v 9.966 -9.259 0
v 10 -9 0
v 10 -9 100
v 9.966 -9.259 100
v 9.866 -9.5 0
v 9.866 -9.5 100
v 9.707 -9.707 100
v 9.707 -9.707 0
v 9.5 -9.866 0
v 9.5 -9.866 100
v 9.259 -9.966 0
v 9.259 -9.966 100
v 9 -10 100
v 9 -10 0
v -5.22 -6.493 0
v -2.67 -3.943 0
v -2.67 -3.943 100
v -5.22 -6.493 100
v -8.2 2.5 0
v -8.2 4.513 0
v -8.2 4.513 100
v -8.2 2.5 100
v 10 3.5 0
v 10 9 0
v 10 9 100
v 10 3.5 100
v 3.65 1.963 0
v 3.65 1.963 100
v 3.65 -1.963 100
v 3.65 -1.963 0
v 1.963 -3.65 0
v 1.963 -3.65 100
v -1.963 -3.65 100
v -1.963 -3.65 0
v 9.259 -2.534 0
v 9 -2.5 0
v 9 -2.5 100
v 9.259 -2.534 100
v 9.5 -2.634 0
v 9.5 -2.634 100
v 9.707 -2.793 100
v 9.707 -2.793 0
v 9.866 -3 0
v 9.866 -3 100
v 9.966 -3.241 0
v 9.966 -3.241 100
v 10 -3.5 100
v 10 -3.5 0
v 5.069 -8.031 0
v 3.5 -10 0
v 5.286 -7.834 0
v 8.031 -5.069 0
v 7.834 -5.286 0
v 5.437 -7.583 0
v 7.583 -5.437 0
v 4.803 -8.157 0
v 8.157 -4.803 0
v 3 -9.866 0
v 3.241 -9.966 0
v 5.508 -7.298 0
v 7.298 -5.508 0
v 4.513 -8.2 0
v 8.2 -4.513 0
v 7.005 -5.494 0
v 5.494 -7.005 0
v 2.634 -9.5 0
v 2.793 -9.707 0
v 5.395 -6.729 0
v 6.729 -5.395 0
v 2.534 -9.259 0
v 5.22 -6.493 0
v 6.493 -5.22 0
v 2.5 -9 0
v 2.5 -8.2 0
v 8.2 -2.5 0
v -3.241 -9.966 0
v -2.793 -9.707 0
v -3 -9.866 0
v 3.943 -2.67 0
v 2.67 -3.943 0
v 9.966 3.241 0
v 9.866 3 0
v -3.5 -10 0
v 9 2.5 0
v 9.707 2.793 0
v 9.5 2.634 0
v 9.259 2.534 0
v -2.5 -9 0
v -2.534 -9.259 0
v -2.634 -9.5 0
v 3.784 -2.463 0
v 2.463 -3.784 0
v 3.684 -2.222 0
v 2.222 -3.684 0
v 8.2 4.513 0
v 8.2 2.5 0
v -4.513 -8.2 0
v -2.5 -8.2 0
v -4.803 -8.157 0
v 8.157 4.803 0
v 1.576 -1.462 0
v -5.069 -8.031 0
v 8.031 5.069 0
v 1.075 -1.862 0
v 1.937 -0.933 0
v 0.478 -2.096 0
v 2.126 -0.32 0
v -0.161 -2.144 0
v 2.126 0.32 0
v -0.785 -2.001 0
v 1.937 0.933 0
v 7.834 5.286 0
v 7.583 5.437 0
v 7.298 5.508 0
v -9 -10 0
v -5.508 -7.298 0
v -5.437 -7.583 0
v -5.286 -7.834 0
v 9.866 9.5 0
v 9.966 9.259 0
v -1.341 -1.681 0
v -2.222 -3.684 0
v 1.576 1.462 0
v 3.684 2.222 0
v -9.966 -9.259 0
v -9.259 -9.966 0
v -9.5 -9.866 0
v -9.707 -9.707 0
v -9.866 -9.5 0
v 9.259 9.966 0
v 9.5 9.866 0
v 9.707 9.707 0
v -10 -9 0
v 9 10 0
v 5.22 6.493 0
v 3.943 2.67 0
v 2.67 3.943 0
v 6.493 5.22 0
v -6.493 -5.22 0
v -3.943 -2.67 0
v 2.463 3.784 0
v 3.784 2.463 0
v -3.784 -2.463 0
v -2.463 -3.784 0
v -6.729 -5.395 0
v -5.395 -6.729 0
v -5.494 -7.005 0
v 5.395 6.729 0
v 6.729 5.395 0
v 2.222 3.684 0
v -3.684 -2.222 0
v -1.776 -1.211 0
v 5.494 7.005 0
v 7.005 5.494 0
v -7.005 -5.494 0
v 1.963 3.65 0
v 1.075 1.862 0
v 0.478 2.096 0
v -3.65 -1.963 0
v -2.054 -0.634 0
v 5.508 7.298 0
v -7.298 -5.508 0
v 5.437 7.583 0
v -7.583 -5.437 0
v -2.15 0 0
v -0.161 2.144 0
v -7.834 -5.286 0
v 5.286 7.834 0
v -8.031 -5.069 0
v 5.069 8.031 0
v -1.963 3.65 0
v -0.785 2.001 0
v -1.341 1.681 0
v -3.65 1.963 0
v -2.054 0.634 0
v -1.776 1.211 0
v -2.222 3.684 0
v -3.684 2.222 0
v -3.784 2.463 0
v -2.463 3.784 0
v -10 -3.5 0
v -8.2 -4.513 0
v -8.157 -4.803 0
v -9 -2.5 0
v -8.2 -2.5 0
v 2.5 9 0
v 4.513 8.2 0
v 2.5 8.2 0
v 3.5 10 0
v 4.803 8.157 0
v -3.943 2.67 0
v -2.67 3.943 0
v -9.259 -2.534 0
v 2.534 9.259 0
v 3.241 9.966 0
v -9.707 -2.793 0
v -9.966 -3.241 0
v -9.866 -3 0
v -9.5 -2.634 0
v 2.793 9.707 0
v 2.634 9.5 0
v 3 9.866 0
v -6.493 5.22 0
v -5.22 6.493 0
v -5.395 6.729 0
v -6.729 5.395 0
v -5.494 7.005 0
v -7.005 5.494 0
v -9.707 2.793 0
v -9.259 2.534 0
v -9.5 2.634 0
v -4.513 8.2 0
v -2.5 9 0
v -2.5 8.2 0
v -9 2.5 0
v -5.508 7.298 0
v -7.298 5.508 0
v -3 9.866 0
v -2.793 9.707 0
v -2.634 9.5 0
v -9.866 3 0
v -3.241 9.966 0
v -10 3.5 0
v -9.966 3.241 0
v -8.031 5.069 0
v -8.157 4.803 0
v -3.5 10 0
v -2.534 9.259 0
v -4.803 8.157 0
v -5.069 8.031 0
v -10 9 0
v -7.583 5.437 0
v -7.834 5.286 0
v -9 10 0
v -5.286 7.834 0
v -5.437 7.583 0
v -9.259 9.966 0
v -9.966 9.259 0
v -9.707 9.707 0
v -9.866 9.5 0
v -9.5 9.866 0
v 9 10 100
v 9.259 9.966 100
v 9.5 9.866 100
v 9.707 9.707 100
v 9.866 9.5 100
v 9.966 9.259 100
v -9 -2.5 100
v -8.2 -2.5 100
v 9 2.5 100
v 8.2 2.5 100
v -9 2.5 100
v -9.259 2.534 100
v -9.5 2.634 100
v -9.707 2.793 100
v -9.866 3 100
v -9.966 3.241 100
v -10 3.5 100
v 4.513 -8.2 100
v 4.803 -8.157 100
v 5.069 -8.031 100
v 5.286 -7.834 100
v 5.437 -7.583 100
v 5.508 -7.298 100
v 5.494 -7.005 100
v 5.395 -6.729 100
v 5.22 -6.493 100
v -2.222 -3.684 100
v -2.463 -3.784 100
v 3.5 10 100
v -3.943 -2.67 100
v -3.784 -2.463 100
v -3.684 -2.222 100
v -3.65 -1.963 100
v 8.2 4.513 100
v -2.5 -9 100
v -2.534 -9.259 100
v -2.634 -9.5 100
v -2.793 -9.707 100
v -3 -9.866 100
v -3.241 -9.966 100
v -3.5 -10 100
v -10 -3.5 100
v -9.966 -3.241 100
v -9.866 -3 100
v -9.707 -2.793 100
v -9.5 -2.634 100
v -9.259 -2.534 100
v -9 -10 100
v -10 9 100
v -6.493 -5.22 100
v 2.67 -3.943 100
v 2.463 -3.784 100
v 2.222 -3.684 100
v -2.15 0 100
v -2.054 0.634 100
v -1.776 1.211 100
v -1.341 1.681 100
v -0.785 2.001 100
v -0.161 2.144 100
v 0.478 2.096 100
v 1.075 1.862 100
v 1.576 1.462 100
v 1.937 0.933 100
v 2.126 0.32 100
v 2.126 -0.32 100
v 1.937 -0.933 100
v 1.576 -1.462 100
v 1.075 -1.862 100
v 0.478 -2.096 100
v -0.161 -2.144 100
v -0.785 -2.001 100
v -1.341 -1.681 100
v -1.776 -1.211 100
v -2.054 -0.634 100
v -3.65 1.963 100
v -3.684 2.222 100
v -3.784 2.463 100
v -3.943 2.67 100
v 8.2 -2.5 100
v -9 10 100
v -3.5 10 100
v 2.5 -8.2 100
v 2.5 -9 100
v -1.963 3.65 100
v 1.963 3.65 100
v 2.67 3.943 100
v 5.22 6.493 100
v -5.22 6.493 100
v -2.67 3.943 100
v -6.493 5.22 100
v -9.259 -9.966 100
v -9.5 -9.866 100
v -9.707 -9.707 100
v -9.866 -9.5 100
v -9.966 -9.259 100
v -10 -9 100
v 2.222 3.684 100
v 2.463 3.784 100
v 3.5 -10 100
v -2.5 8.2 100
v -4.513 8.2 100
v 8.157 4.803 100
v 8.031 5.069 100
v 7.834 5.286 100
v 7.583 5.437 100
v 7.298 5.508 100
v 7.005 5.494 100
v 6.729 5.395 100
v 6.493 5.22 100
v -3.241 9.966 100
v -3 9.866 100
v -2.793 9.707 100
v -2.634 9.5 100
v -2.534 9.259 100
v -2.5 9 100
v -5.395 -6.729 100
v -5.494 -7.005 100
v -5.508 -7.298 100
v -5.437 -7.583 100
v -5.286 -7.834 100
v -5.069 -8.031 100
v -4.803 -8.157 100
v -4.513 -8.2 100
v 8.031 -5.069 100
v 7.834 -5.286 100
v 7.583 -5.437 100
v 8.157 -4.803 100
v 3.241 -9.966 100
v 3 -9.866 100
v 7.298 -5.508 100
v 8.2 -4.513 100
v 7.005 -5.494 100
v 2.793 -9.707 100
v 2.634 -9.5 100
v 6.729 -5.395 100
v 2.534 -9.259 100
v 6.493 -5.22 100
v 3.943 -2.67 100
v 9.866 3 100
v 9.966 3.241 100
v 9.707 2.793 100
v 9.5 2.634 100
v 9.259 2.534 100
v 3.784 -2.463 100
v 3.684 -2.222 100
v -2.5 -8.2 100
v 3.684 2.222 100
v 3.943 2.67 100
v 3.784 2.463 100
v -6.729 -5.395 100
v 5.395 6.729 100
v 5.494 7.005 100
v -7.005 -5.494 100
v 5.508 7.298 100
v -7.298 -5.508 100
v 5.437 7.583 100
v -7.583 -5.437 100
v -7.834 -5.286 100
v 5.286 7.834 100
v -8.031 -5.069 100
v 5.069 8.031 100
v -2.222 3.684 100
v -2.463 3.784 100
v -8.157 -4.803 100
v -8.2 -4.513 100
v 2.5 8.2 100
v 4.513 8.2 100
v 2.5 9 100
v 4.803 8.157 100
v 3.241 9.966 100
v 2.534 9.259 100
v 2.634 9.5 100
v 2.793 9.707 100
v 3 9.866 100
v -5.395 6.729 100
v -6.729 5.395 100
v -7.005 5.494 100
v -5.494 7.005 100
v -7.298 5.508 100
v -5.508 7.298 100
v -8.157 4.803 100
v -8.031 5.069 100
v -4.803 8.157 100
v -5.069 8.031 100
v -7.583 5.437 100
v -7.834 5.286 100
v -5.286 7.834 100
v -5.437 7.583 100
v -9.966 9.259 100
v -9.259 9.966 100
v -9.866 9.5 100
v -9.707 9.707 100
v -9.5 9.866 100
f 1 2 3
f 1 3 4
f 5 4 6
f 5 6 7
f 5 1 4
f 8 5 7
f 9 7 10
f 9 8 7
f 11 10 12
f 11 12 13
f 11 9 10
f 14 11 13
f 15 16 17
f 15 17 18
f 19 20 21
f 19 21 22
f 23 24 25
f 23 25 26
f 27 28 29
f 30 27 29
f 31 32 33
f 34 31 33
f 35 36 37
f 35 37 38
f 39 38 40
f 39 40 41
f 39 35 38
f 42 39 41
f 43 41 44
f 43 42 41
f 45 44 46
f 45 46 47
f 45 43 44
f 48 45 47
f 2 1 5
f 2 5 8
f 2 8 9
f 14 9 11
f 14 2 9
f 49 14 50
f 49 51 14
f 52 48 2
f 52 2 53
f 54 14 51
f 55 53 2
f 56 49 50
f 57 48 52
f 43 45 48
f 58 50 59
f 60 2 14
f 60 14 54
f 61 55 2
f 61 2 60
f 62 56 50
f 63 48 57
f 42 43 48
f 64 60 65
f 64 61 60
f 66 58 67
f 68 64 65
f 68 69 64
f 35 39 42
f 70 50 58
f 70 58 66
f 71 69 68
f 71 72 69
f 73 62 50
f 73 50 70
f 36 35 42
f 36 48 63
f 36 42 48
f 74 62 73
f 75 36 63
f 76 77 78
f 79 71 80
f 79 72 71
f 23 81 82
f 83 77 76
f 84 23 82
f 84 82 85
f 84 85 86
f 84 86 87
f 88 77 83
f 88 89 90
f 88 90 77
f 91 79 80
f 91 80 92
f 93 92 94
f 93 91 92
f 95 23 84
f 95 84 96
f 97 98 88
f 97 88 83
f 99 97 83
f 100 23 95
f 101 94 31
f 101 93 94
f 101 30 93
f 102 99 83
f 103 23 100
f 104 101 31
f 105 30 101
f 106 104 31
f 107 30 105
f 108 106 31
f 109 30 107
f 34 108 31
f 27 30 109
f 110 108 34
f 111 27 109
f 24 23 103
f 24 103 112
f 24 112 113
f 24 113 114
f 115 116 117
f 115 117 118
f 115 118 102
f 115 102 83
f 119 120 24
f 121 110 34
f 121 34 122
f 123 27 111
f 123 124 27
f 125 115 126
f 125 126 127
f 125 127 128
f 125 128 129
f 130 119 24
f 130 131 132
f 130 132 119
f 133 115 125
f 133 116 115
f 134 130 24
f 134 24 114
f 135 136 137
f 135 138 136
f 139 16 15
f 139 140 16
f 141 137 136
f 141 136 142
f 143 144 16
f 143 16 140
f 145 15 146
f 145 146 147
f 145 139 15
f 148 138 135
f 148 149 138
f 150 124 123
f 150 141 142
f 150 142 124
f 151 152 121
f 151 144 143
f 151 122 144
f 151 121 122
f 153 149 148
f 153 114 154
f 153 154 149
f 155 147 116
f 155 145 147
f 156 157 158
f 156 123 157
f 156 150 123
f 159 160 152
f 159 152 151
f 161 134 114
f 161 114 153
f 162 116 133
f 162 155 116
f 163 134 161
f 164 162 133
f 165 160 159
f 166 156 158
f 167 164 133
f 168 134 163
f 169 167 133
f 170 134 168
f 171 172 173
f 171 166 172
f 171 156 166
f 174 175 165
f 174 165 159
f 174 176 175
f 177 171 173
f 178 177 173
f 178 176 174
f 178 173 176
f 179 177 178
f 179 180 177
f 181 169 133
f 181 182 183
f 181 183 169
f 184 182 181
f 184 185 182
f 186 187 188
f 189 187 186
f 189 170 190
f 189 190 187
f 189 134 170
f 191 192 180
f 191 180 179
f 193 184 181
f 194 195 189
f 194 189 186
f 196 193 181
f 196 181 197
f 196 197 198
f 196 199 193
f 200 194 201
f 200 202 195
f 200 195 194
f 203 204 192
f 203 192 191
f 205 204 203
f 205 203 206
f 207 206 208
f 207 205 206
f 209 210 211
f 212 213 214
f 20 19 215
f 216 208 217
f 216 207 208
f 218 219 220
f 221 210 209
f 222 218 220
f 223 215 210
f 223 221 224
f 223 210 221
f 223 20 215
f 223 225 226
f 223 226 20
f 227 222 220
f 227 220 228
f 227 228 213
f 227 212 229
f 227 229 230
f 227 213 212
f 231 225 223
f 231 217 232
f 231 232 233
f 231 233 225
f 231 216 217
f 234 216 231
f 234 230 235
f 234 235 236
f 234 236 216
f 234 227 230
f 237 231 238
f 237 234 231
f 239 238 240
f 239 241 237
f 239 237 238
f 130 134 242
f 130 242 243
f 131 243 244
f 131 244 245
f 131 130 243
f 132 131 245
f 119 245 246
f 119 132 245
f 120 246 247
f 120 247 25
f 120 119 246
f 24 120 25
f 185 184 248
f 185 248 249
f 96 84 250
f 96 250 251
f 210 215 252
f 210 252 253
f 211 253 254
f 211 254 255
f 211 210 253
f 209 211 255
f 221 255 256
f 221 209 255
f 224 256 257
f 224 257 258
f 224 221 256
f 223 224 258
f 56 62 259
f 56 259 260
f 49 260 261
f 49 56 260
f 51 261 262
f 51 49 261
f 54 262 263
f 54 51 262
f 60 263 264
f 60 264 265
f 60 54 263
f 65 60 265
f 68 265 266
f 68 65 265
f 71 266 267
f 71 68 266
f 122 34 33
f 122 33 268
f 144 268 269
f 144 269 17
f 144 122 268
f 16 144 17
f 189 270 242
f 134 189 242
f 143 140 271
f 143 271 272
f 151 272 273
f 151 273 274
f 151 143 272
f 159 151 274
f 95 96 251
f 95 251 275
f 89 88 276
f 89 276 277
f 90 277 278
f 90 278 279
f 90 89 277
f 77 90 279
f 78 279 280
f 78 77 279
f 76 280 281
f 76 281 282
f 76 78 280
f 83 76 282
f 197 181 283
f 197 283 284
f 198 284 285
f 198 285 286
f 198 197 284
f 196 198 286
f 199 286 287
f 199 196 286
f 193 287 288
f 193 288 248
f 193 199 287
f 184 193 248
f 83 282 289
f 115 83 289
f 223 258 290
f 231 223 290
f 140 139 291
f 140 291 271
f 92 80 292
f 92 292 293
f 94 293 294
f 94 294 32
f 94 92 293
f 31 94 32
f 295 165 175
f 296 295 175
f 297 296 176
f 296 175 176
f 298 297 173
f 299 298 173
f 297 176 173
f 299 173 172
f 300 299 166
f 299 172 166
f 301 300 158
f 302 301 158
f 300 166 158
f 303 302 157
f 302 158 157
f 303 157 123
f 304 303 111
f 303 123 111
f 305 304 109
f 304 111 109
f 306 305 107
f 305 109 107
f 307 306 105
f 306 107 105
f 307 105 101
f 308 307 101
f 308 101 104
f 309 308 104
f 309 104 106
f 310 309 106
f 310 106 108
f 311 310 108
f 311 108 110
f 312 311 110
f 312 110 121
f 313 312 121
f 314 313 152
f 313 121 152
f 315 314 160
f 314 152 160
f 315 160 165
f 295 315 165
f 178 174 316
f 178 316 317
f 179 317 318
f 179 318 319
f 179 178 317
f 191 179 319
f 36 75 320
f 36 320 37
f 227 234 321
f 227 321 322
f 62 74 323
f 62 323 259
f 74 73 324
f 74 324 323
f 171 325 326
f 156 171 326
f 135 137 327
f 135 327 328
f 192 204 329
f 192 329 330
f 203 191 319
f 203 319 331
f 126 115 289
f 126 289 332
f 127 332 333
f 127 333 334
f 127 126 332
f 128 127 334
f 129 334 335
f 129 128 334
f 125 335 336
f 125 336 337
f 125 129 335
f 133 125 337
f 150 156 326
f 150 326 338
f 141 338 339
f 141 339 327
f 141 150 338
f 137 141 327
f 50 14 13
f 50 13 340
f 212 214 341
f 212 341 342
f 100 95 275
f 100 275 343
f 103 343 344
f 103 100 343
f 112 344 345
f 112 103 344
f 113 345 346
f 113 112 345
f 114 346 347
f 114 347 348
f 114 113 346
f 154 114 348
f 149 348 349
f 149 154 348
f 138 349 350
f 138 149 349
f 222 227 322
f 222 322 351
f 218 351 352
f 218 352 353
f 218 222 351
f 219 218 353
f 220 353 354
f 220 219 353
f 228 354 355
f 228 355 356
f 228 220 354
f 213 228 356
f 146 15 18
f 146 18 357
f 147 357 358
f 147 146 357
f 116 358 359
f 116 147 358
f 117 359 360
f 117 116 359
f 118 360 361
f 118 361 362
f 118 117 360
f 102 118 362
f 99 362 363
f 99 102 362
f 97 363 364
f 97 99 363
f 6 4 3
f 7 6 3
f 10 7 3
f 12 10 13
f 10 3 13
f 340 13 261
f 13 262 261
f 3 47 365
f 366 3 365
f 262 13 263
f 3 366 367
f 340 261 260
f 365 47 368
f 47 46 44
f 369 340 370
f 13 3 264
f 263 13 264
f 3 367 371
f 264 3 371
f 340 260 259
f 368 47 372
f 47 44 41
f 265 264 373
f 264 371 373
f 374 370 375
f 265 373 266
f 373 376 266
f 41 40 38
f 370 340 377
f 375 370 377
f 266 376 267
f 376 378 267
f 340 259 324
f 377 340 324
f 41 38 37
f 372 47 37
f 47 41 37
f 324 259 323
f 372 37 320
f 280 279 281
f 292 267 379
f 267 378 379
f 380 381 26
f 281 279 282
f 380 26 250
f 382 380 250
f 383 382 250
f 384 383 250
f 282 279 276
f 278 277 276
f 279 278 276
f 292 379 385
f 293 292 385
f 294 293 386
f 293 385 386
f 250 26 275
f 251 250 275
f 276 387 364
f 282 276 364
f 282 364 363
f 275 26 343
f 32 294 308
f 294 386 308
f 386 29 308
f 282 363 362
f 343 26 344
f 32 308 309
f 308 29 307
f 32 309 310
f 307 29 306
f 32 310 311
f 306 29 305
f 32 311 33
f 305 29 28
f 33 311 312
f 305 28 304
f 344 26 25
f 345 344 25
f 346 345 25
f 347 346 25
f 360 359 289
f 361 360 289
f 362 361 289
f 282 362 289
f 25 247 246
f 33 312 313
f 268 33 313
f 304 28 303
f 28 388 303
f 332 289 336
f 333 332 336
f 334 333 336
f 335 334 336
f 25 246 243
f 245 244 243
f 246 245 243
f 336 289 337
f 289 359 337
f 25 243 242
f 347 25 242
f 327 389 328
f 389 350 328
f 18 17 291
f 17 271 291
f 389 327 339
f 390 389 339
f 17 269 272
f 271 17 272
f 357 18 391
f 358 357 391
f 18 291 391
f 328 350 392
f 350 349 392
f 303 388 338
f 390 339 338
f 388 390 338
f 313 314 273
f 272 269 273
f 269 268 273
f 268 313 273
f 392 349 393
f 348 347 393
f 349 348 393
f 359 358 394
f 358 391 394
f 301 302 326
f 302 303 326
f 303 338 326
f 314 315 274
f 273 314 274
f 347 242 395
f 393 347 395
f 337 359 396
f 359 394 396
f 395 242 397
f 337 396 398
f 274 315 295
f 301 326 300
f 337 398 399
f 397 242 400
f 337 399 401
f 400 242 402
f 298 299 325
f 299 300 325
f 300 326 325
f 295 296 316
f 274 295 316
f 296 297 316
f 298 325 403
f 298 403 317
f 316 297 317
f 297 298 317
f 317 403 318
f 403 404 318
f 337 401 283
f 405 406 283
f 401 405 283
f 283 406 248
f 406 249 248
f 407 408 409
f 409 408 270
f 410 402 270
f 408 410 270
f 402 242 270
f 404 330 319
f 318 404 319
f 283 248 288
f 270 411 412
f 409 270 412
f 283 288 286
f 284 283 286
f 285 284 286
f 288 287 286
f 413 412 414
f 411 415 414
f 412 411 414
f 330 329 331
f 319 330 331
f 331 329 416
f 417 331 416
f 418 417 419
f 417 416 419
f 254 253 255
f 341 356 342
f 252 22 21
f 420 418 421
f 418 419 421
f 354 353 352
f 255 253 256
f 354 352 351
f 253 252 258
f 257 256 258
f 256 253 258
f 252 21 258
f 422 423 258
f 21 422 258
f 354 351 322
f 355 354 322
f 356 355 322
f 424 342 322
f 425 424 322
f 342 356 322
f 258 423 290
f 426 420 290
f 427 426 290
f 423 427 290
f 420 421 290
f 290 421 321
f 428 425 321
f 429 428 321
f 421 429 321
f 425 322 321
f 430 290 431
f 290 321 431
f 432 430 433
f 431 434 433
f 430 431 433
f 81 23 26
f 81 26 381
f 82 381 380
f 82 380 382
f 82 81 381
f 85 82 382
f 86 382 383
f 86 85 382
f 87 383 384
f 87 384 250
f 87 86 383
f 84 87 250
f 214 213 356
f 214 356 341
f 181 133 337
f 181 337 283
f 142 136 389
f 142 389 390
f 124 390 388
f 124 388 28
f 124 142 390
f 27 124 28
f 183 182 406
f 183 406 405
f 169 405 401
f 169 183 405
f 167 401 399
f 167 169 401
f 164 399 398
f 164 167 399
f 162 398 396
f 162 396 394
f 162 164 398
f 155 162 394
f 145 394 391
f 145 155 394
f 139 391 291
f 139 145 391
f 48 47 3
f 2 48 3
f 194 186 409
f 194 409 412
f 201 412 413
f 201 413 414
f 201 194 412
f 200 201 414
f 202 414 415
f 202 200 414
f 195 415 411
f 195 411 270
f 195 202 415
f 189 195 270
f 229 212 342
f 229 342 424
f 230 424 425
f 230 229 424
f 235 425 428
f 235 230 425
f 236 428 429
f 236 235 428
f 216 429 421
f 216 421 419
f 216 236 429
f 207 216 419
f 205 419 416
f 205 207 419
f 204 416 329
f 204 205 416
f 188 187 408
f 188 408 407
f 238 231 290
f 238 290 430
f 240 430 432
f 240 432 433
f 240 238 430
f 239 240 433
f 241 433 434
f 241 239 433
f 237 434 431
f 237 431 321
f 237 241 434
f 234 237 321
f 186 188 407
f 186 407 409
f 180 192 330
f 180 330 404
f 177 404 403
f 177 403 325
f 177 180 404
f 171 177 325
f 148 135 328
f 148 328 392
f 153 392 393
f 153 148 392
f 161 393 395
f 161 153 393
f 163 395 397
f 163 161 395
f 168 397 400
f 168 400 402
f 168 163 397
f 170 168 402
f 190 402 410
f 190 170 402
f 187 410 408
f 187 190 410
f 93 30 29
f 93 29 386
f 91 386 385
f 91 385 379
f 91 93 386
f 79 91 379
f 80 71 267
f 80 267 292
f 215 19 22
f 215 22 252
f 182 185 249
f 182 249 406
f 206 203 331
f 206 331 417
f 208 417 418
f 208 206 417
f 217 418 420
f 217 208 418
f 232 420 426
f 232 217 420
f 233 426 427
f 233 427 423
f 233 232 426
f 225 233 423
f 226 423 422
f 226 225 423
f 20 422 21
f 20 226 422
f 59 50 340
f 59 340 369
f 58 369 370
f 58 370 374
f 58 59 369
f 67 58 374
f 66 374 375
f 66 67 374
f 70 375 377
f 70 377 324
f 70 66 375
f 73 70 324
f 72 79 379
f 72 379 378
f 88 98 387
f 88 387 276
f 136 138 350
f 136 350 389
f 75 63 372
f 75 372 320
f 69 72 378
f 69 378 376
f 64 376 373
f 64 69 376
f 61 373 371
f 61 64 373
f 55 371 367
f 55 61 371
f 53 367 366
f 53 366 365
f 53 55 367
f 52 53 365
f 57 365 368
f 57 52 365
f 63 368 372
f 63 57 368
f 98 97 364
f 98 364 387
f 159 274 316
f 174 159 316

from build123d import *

# Parameters (mm, degrees)
SCHIZZO1_R                   = 2.15
ESTRUSIONE_ESTRUSIONE1_DEPTH = 100


with BuildPart() as part:
    # Schizzo1 → Estrusione-Estrusione1 (new body)
    with BuildSketch(Plane(origin=(0, 0, 0), x_dir=(-1, 0, 0), z_dir=(0, 0, -1))):
        with BuildLine():
            Line((8.2, 2.5), (9, 2.5))
            ThreePointArc((9, 2.5), (9.707106781, 2.792893219), (10, 3.5))
            Line((10, 3.5), (10, 9))
            ThreePointArc((10, 9), (9.707106781, 9.707106781), (9, 10))
            Line((9, 10), (3.5, 10))
            ThreePointArc((3.5, 10), (2.792893219, 9.707106781), (2.5, 9))
            Line((2.5, 9), (2.5, 8.2))
            Line((2.5, 8.2), (4.512994231, 8.2))
            ThreePointArc((4.512994231, 8.2), (5.436873764, 7.582683432), (5.220101013, 6.492893219))
            Line((5.220101013, 6.492893219), (2.670101013, 3.942893219))
            ThreePointArc((2.670101013, 3.942893219), (2.345677664, 3.726120467), (1.962994231, 3.65))
            Line((1.962994231, 3.65), (-1.962994231, 3.65))
            ThreePointArc((-1.962994231, 3.65), (-2.345677664, 3.726120467), (-2.670101013, 3.942893219))
            Line((-2.670101013, 3.942893219), (-5.220101013, 6.492893219))
            ThreePointArc((-5.220101013, 6.492893219), (-5.436873764, 7.582683432), (-4.512994231, 8.2))
            Line((-4.512994231, 8.2), (-2.5, 8.2))
            Line((-2.5, 8.2), (-2.5, 9))
            ThreePointArc((-2.5, 9), (-2.792893219, 9.707106781), (-3.5, 10))
            Line((-3.5, 10), (-9, 10))
            ThreePointArc((-9, 10), (-9.707106781, 9.707106781), (-10, 9))
            Line((-10, 9), (-10, 3.5))
            ThreePointArc((-10, 3.5), (-9.707106781, 2.792893219), (-9, 2.5))
            Line((-9, 2.5), (-8.2, 2.5))
            Line((-8.2, 2.5), (-8.2, 4.512994231))
            ThreePointArc((-8.2, 4.512994231), (-7.582683432, 5.436873764), (-6.492893219, 5.220101013))
            Line((-6.492893219, 5.220101013), (-3.942893219, 2.670101013))
            ThreePointArc((-3.942893219, 2.670101013), (-3.726120467, 2.345677664), (-3.65, 1.962994231))
            Line((-3.65, 1.962994231), (-3.65, -1.962994231))
            ThreePointArc((-3.65, -1.962994231), (-3.726120467, -2.345677664), (-3.942893219, -2.670101013))
            Line((-3.942893219, -2.670101013), (-6.492893219, -5.220101013))
            ThreePointArc((-6.492893219, -5.220101013), (-7.582683432, -5.436873764), (-8.2, -4.512994231))
            Line((-8.2, -4.512994231), (-8.2, -2.5))
            Line((-8.2, -2.5), (-9, -2.5))
            ThreePointArc((-9, -2.5), (-9.707106781, -2.792893219), (-10, -3.5))
            Line((-10, -3.5), (-10, -9))
            ThreePointArc((-10, -9), (-9.707106781, -9.707106781), (-9, -10))
            Line((-9, -10), (-3.5, -10))
            ThreePointArc((-3.5, -10), (-2.792893219, -9.707106781), (-2.5, -9))
            Line((-2.5, -9), (-2.5, -8.2))
            Line((-2.5, -8.2), (-4.512994231, -8.2))
            ThreePointArc((-4.512994231, -8.2), (-5.436873764, -7.582683432), (-5.220101013, -6.492893219))
            Line((-5.220101013, -6.492893219), (-2.670101013, -3.942893219))
            ThreePointArc((-2.670101013, -3.942893219), (-2.345677664, -3.726120467), (-1.962994231, -3.65))
            Line((-1.962994231, -3.65), (1.962994231, -3.65))
            ThreePointArc((1.962994231, -3.65), (2.345677664, -3.726120467), (2.670101013, -3.942893219))
            Line((2.670101013, -3.942893219), (5.220101013, -6.492893219))
            ThreePointArc((5.220101013, -6.492893219), (5.436873764, -7.582683432), (4.512994231, -8.2))
            Line((4.512994231, -8.2), (2.5, -8.2))
            Line((2.5, -8.2), (2.5, -9))
            ThreePointArc((2.5, -9), (2.792893219, -9.707106781), (3.5, -10))
            Line((3.5, -10), (9, -10))
            ThreePointArc((9, -10), (9.707106781, -9.707106781), (10, -9))
            Line((10, -9), (10, -3.5))
            ThreePointArc((10, -3.5), (9.707106781, -2.792893219), (9, -2.5))
            Line((9, -2.5), (8.2, -2.5))
            Line((8.2, -2.5), (8.2, -4.512994231))
            ThreePointArc((8.2, -4.512994231), (7.582683432, -5.436873764), (6.492893219, -5.220101013))
            Line((6.492893219, -5.220101013), (3.942893219, -2.670101013))
            ThreePointArc((3.942893219, -2.670101013), (3.726120467, -2.345677664), (3.65, -1.962994231))
            Line((3.65, -1.962994231), (3.65, 1.962994231))
            ThreePointArc((3.65, 1.962994231), (3.726120467, 2.345677664), (3.942893219, 2.670101013))
            Line((3.942893219, 2.670101013), (6.492893219, 5.220101013))
            ThreePointArc((6.492893219, 5.220101013), (7.582683432, 5.436873764), (8.2, 4.512994231))
            Line((8.2, 4.512994231), (8.2, 2.5))
        make_face()
        Circle(SCHIZZO1_R, mode=Mode.SUBTRACT)
    extrude(amount=-ESTRUSIONE_ESTRUSIONE1_DEPTH)


solid = part.part
